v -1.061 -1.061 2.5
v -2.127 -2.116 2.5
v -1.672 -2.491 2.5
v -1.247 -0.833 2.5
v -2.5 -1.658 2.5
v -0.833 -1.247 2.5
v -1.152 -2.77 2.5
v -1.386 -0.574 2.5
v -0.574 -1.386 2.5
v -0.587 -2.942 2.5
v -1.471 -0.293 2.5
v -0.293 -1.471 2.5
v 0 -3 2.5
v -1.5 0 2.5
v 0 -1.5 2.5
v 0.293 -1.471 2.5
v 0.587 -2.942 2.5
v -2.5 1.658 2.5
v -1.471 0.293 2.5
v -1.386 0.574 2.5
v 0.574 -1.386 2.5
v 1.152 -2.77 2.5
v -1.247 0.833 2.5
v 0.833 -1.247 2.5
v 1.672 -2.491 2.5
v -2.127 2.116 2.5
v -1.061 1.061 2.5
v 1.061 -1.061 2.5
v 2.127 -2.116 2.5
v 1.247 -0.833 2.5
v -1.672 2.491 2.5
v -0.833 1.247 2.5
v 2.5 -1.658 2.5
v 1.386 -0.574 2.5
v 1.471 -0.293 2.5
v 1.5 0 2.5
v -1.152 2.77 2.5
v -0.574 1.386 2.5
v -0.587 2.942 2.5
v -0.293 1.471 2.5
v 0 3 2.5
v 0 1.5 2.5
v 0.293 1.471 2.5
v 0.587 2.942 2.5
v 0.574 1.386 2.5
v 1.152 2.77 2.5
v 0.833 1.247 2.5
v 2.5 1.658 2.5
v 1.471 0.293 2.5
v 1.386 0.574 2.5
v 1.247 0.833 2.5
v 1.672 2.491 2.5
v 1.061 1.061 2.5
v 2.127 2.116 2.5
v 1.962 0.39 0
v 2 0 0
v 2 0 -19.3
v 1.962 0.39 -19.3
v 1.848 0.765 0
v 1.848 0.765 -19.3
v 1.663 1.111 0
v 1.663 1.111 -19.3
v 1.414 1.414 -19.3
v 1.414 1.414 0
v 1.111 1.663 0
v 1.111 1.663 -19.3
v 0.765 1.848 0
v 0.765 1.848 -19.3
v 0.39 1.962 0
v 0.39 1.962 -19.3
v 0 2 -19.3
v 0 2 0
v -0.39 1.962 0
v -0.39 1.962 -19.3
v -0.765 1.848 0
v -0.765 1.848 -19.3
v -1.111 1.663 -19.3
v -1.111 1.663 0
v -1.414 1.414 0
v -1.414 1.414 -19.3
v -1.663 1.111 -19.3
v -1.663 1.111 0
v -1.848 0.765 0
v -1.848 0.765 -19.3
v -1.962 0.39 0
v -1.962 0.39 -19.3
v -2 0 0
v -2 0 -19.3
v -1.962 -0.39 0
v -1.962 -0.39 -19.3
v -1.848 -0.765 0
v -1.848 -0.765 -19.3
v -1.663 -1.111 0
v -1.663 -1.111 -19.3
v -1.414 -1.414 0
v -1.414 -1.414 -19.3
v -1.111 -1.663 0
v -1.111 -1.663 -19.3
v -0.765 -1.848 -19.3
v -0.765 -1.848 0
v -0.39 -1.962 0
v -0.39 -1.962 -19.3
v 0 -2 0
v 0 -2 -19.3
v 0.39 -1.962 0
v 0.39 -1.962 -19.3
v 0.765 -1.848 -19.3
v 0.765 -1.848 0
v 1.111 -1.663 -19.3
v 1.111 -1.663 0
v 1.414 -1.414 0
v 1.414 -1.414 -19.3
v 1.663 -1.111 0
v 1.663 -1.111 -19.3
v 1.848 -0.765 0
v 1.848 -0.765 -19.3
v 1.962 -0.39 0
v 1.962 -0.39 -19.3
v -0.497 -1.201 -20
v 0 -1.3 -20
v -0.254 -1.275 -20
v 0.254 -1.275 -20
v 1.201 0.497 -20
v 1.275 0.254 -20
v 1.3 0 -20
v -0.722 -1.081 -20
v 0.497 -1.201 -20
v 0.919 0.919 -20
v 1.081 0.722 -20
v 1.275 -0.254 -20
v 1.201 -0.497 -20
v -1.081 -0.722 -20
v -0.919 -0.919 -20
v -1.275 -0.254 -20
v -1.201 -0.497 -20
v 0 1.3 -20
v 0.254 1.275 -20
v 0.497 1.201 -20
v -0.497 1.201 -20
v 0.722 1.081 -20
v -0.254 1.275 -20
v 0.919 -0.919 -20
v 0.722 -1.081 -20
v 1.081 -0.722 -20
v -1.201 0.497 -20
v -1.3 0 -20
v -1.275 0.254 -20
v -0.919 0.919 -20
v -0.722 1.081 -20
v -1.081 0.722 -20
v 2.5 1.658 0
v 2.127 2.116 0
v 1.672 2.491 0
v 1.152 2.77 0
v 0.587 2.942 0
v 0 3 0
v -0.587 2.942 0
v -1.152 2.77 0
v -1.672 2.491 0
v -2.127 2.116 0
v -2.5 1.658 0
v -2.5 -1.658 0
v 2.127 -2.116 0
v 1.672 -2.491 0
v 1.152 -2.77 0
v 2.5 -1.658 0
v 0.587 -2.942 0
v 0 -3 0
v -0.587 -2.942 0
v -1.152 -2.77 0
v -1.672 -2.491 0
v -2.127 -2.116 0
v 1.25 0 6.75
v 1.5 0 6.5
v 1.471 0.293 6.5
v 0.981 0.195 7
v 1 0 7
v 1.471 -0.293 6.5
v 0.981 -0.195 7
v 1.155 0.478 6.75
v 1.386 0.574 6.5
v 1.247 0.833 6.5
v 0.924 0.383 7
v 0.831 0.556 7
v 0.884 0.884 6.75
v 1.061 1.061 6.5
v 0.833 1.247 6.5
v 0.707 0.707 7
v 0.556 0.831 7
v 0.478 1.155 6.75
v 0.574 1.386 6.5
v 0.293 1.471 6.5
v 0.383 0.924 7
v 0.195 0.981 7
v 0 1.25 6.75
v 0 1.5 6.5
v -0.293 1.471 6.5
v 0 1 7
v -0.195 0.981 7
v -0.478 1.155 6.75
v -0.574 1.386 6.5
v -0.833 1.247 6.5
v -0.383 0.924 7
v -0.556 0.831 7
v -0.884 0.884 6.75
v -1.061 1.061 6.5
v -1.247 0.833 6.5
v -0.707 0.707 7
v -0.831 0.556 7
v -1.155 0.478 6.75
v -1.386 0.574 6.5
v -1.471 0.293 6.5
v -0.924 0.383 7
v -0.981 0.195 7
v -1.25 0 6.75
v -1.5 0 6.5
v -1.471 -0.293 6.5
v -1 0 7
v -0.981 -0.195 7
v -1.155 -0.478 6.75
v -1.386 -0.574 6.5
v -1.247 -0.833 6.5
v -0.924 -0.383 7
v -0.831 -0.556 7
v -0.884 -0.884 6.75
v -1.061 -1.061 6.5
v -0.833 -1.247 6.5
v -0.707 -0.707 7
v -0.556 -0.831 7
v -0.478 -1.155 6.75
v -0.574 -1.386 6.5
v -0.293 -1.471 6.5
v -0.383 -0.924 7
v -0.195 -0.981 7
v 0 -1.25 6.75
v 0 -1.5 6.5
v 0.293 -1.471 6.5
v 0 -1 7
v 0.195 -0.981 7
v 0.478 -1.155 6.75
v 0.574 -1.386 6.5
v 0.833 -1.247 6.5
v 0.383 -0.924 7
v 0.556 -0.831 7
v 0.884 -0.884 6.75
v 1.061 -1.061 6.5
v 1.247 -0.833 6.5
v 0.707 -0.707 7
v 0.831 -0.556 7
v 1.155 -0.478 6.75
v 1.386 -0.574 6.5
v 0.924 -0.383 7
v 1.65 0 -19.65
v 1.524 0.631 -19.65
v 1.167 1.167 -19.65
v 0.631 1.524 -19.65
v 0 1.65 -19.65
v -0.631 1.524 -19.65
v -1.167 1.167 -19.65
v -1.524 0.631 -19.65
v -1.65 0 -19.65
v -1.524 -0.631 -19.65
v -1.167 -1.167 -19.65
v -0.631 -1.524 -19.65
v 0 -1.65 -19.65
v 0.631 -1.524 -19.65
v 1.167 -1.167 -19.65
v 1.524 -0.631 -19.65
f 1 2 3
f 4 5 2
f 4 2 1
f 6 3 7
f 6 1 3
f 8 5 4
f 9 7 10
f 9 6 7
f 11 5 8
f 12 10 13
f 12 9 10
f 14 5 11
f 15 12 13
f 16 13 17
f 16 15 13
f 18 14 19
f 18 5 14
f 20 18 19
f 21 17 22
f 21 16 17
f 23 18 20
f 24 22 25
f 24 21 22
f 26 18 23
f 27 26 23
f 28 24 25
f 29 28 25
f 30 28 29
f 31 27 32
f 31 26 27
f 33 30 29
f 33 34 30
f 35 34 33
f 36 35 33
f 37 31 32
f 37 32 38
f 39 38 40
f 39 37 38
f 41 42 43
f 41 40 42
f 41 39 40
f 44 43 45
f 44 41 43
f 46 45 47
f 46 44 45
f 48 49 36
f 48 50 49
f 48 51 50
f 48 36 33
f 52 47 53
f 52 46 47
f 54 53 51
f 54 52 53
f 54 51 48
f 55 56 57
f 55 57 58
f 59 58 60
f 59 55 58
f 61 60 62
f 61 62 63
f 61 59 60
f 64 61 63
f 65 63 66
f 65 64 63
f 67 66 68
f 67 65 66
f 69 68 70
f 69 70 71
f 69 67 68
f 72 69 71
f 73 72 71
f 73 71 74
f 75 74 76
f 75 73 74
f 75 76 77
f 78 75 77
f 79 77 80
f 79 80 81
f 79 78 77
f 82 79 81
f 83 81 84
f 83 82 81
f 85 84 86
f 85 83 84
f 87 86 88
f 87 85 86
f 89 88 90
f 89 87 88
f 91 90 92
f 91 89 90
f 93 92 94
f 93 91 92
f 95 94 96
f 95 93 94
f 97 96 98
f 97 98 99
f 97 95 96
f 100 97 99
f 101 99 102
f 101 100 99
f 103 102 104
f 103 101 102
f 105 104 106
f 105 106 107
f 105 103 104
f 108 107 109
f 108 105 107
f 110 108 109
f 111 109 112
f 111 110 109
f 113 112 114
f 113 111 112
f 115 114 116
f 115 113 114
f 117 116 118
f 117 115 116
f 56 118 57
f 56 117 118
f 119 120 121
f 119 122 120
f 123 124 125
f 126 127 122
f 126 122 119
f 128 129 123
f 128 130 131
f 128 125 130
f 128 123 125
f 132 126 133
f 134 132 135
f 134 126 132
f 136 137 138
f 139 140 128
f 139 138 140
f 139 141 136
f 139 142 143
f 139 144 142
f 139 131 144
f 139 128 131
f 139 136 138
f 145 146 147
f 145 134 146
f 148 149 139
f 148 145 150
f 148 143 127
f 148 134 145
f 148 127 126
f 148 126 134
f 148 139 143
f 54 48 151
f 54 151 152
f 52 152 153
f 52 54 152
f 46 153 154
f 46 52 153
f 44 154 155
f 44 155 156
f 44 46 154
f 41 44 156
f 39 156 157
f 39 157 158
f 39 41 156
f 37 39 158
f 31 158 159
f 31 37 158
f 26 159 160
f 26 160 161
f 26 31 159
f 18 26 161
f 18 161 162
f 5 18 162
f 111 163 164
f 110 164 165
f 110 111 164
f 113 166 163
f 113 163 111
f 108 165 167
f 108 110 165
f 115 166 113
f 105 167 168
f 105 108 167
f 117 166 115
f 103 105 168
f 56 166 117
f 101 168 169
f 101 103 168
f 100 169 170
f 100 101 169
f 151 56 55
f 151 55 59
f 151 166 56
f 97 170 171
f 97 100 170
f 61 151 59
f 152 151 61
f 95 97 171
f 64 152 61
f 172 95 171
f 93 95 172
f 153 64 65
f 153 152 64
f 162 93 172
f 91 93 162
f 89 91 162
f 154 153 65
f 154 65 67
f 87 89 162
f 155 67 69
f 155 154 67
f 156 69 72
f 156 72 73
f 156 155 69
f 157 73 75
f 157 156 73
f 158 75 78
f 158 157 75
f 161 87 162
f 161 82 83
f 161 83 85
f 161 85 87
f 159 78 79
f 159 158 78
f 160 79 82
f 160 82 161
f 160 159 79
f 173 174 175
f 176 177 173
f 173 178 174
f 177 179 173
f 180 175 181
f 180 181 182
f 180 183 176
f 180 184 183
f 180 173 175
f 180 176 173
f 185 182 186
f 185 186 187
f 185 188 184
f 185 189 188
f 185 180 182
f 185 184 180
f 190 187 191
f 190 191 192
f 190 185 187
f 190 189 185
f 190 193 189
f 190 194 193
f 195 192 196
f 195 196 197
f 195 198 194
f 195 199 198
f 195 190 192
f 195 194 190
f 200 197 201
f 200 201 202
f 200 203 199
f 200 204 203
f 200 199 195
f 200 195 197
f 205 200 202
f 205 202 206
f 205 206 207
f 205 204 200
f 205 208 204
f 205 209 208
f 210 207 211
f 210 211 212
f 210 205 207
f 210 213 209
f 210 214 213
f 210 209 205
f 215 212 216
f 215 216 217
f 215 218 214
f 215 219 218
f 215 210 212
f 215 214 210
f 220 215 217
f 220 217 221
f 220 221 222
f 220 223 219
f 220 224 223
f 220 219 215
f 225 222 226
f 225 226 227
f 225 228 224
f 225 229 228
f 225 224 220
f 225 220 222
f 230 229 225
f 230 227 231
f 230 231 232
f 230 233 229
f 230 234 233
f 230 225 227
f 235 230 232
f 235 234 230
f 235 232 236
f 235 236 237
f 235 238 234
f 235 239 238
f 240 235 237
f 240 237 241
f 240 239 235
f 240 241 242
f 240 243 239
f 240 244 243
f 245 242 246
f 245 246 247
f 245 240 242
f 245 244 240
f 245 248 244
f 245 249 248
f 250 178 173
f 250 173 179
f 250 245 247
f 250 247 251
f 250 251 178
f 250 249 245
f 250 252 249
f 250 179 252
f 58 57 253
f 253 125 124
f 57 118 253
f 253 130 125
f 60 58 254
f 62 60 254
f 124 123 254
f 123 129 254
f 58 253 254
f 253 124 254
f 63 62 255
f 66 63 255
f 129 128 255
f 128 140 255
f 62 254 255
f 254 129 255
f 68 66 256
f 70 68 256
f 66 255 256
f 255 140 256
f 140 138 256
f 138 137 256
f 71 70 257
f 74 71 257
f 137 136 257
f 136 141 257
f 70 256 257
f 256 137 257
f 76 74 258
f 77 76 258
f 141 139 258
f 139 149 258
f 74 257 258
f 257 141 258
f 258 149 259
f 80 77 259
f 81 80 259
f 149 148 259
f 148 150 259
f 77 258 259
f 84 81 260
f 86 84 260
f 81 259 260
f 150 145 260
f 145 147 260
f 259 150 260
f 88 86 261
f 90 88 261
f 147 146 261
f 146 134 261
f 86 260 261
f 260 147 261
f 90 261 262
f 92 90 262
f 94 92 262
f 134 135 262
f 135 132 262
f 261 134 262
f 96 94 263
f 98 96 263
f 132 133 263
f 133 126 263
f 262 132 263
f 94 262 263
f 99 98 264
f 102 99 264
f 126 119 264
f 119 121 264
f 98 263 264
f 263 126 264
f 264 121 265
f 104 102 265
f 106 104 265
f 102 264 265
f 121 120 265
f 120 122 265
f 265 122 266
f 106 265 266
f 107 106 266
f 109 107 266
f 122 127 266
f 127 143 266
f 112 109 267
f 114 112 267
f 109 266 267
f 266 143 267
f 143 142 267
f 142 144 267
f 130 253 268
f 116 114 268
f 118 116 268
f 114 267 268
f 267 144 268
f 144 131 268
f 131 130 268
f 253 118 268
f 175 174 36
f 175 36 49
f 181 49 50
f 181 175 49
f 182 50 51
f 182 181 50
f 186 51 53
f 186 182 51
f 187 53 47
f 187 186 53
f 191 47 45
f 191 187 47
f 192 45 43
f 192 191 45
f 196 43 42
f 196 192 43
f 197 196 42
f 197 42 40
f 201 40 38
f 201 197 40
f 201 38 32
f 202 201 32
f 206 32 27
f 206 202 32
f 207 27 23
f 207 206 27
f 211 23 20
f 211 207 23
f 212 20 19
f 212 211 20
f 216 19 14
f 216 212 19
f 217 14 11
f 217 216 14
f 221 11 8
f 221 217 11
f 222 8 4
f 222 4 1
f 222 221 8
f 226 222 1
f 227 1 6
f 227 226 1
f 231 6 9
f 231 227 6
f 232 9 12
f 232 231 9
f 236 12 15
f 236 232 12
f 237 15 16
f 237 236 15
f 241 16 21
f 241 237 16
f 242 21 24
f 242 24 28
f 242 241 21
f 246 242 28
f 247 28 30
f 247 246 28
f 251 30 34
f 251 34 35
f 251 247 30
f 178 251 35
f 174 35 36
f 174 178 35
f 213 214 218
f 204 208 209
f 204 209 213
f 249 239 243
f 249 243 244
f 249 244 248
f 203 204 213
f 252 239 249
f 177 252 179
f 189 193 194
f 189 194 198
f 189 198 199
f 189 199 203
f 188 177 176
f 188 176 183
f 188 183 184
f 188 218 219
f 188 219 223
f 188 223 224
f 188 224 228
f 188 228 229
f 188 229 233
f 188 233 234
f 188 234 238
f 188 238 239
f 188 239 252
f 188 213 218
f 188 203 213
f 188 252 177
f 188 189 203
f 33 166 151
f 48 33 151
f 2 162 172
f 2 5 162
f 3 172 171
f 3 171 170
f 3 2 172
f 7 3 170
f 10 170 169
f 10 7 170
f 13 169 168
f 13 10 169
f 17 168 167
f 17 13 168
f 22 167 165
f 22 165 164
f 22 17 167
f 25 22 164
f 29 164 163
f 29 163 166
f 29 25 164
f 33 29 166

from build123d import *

# Parameters (mm, degrees)
F2_SIZE  = 0.5
F3_SIZE  = 0.7
F5_DEPTH = 2.5


with BuildPart() as f1:
    # F0 (on Front) → F1 (revolve)
    with BuildSketch(Plane.XZ):
        Polygon((3, 2.5), (1.5, 2.5), (1.5, 7), (0, 7), (0, -20), (2, -20), (2, 0), (3, 0), align=None)
    revolve(axis=Axis((0, 0, -6.5), (0, 0, 1)))

    # F2
    f2_edges = [f1.edges().sort_by_distance(p)[0] for p in [
        (-1.5, 0, 7),
    ]]
    chamfer(f2_edges, length=F2_SIZE)

    # F3
    f3_edges = [f1.edges().sort_by_distance(p)[0] for p in [
        (-2, 0, -20),
    ]]
    chamfer(f3_edges, length=F3_SIZE)

    # F4 (on face) → F5 (cut, through all)
    with BuildSketch(Plane(origin=(0, 0, 0), x_dir=(1, 0, 0), z_dir=(0, 0, -1))):
        with BuildLine():
            ThreePointArc((3, 0), (2.8722813233, 0.8660254038), (2.5, 1.6583123952))
            Line((2.5, 1.6583123952), (2.5, -1.6583123952))
            ThreePointArc((2.5, -1.6583123952), (2.8722813233, -0.8660254038), (3, 0))
        make_face()
        with BuildLine():
            Line((-2.5, -1.6583123952), (-2.5, 1.6583123952))
            ThreePointArc((-2.5, 1.6583123952), (-3, 0), (-2.5, -1.6583123952))
        make_face()
    extrude(amount=-F5_DEPTH, mode=Mode.SUBTRACT)


solid = f1.part
